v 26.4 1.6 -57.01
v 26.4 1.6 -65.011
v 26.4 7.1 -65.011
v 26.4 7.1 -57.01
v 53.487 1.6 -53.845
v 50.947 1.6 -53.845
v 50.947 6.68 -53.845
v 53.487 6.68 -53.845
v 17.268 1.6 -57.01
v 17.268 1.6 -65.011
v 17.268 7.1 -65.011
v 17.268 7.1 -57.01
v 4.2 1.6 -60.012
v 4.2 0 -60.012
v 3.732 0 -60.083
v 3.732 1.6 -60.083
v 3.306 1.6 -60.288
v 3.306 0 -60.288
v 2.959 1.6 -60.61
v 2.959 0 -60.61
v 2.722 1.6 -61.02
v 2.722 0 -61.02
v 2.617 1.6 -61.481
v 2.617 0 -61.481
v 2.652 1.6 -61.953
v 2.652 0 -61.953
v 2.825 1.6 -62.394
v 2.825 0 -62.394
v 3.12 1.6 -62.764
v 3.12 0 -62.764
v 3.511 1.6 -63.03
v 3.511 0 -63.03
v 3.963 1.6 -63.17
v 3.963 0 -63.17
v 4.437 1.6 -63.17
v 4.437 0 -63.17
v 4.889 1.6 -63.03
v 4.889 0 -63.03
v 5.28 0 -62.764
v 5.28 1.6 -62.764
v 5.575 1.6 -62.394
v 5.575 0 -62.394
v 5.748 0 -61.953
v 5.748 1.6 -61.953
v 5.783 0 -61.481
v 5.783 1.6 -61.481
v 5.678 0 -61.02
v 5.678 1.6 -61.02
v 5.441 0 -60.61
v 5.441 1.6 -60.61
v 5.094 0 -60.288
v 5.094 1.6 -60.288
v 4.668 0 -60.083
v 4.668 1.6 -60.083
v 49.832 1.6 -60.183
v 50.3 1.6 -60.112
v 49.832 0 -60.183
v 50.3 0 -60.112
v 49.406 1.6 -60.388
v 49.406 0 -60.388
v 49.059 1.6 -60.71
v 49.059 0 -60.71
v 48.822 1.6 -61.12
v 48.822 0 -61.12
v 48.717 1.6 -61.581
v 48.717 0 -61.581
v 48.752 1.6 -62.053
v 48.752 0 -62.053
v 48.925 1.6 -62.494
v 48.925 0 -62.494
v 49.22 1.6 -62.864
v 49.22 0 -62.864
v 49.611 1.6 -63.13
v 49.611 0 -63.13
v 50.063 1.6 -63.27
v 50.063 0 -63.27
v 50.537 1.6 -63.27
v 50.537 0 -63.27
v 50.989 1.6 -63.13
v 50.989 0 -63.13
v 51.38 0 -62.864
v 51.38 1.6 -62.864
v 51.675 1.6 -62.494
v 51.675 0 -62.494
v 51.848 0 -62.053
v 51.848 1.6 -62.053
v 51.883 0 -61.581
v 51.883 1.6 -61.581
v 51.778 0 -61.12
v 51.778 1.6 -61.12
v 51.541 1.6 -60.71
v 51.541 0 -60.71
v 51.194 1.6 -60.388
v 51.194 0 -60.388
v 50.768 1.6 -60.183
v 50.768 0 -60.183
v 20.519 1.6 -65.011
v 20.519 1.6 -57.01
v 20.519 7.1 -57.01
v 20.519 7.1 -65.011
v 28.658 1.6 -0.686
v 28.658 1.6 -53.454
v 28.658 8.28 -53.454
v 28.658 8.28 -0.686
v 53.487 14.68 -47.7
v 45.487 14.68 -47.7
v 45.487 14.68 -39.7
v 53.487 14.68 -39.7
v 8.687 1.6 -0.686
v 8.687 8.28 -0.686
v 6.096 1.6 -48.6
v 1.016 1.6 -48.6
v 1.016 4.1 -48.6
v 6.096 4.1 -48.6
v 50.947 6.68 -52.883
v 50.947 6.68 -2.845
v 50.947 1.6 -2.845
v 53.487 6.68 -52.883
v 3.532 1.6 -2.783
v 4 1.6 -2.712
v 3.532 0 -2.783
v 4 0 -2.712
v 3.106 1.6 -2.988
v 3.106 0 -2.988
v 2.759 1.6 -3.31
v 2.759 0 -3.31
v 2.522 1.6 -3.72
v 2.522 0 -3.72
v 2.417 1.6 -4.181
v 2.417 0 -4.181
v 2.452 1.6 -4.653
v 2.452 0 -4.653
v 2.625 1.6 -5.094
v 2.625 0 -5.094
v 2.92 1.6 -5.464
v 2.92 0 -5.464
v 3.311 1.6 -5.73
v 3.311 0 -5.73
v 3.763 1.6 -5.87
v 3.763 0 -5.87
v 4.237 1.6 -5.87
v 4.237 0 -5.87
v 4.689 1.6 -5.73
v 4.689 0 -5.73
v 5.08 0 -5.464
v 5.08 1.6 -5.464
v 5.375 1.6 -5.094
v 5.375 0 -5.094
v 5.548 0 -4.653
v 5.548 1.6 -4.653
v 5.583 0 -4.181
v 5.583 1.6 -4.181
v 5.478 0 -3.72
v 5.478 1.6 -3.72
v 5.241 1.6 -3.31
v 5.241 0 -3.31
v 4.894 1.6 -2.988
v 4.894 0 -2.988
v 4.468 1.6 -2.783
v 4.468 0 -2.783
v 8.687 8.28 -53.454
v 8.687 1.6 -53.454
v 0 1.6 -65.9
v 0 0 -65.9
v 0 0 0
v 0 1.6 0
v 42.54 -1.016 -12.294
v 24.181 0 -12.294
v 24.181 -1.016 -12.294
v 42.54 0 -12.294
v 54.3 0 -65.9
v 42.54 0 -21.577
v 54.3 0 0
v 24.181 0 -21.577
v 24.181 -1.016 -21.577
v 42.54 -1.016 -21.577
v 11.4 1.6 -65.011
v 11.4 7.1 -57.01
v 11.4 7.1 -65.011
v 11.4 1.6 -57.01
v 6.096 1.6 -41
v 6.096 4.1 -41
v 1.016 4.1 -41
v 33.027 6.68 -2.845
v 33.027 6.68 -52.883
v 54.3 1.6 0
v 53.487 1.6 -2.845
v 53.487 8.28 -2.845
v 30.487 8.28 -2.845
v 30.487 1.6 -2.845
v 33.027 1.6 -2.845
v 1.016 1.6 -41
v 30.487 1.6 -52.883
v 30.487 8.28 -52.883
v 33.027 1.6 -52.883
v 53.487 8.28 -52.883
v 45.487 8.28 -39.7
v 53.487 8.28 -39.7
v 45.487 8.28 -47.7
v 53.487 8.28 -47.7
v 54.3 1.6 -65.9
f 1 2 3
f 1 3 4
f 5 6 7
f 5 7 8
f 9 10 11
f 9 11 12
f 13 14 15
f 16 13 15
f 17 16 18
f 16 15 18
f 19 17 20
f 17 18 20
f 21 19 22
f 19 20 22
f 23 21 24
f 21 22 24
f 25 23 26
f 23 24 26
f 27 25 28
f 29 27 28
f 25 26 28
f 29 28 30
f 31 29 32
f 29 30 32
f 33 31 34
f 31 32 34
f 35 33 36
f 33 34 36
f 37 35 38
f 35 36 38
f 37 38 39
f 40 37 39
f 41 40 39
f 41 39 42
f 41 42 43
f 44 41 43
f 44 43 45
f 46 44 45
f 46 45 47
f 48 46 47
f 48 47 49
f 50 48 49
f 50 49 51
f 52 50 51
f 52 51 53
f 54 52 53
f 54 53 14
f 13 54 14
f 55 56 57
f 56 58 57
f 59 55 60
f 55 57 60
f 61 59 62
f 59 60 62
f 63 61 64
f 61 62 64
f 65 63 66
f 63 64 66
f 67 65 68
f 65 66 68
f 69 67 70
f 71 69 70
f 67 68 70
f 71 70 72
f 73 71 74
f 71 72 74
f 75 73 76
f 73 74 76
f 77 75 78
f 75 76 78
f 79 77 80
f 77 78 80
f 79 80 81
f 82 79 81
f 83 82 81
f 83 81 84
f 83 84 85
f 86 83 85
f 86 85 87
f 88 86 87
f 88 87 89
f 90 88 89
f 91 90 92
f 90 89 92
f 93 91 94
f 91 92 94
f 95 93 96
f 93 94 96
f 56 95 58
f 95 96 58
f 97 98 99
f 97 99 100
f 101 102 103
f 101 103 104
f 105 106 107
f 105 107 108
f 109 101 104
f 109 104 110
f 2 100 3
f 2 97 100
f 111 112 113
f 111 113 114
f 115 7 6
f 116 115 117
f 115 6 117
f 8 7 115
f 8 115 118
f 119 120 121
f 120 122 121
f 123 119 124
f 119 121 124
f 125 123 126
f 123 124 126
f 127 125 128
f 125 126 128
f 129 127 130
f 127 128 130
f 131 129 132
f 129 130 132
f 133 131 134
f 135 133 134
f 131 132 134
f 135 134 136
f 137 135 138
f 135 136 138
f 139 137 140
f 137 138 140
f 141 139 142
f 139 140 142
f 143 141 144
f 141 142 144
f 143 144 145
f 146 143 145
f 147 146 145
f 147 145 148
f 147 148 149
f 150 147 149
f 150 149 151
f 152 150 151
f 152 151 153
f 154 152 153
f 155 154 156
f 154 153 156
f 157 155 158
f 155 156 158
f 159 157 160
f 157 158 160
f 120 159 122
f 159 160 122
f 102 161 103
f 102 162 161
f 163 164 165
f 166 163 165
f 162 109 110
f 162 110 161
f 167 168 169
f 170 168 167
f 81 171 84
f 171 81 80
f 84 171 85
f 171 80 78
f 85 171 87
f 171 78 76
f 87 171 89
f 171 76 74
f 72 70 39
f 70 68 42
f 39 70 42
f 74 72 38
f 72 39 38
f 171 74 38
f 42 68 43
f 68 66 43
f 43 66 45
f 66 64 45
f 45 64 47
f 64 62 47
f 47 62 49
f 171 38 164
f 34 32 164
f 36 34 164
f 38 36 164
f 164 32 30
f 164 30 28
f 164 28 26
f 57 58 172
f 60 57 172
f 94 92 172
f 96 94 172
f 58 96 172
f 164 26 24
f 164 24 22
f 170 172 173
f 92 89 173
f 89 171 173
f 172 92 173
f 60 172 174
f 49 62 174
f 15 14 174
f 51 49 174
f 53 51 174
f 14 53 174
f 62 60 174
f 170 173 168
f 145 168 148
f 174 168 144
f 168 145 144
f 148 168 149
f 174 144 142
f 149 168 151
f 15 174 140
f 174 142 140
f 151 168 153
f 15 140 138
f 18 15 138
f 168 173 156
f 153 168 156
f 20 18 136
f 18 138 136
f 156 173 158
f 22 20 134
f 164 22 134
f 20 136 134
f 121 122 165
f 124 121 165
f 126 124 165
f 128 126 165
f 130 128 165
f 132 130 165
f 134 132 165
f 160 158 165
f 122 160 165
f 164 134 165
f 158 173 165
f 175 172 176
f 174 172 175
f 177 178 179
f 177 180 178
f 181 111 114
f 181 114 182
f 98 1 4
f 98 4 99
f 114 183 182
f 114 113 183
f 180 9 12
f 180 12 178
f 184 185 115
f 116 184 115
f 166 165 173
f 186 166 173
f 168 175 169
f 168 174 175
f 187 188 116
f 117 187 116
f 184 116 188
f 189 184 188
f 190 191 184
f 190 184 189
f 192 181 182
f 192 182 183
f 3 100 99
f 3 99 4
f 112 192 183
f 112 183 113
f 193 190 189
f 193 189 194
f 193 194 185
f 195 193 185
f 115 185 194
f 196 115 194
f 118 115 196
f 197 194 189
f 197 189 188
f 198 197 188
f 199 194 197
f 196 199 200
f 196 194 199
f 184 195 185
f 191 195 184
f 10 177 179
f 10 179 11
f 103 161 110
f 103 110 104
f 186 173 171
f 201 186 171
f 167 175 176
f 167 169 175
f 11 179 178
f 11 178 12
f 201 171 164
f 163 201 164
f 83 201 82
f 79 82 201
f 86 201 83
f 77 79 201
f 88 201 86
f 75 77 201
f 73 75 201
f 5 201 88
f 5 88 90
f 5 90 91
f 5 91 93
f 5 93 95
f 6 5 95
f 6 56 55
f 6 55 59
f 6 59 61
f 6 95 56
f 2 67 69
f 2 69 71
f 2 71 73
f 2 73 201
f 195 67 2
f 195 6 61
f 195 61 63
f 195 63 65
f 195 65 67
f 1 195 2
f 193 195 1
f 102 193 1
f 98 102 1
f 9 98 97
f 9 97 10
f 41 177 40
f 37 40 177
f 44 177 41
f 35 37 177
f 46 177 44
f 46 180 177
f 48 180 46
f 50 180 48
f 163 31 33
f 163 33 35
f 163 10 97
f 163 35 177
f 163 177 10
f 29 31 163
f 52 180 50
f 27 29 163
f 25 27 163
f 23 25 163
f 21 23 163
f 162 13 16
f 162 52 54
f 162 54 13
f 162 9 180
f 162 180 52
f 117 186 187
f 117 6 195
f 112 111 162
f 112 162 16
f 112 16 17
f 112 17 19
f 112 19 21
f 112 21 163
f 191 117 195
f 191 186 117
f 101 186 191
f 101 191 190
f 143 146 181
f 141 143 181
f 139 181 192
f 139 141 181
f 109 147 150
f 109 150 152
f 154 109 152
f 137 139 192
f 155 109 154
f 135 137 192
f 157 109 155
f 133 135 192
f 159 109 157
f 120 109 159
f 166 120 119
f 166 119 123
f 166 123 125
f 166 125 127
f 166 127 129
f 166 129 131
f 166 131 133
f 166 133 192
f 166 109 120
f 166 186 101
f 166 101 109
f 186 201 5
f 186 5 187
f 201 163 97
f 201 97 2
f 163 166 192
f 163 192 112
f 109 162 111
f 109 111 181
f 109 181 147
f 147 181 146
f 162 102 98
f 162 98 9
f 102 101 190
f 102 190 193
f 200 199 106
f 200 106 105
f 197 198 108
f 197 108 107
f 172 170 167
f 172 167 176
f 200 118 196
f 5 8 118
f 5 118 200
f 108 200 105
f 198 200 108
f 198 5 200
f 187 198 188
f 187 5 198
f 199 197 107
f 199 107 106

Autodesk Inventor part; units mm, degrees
ref_plane "YZ Plane" through (0, 0, 0) normal (1, 0, 0) x (0, 1, 0)
ref_plane "XZ Plane" through (0, 0, 0) normal (0, 1, 0) x (-1, 0, 0)
ref_plane "XY Plane" through (0, 0, 0) normal (0, 0, 1) x (1, 0, 0)
sketch "Sketch1" plane through (0, 0, 0) normal (0, 1, 0) x (-1, 0, 0)
  line L0 (0, 0) -> (-54.3, 0)
  line L1 (-54.3, 0) -> (-54.3, -65.9)
  line L2 (-54.3, -65.9) -> (0, -65.9)
  line L3 (0, -65.9) -> (0, 0)
  dimension "d0" = 54.3
  dimension "d1" = 65.9
extrude "Extrusion1" add sketch "Sketch1" along normal blind 1.6
sketch "Sketch2" plane through (0, 1.6, 0) normal (0, 1, 0) x (1, 0, 0)
  line L0 (0, 65.9) -> (0, 0) projected
  line L1 (54.3, 65.9) -> (0, 65.9) projected
  line L2 (54.3, 0) -> (54.3, 65.9) projected
  line L3 (0, 0) -> (54.3, 0) projected
  point P0 (4.2, 61.6)
  point P1 (50.3, 61.7)
  point P2 (4, 4.3)
  dimension "d4" = 4.2
  dimension "d5" = 4.3
  dimension "d6" = 4
  dimension "d7" = 4.2
  dimension "d8" = 4
  dimension "d9" = 4.3
hole "Hole1" at (4.2, 1.6, -61.6) at (50.3, 1.6, -61.7) at (4, 1.6, -4.3) direction (0, -1, 0) diameter 3.175 end through all
sketch "Sketch3" plane through (0, 1.6, 0) normal (0, 1, 0) x (1, 0, 0)
  line L0 (53.4872, 53.8448) -> (53.4872, 2.8448)
  line L1 (30.4872, 2.8448) -> (30.4872, 52.8828)
  line L2 (0, 0) -> (54.3, 0) projected
  line L3 (54.3, 0) -> (54.3, 65.9) projected
  line L4 (33.0272, 52.8828) -> (33.0272, 2.8448)
  line L5 (50.9472, 53.8448) -> (50.9472, 2.8448)
  line L6 (30.4872, 52.8828) -> (33.0272, 52.8828)
  line L7 (50.9472, 53.8448) -> (53.4872, 53.8448)
  line L8 (53.4872, 2.8448) -> (50.9472, 2.8448)
  line L9 (33.0272, 2.8448) -> (30.4872, 2.8448)
  dimension "d17" = 23
  dimension "d18" = 51
  dimension "d20" = 0.8128
  dimension "d21" = 2.54
  dimension "d22" = 2.54
extrude "Extrusion2" add sketch "Sketch3" along normal blind 5.08
sketch "Sketch4" plane through (0, 6.68, 0) normal (0, 1, 0) x (1, 0, 0)
  line L0 (30.4872, 52.8828) -> (30.4872, 2.8448) projected
  line L1 (30.4872, 2.8448) -> (33.0272, 2.8448) projected
  line L2 (33.0272, 2.8448) -> (33.0272, 52.8828) projected
  line L3 (33.0272, 52.8828) -> (30.4872, 52.8828) projected
  line L4 (53.4872, 2.8448) -> (53.4872, 53.8448) projected
  line L5 (50.9472, 53.8448) -> (50.9472, 2.8448) projected
  line L6 (50.9472, 2.8448) -> (53.4872, 2.8448) projected
  line L7 (53.4872, 53.8448) -> (50.9472, 53.8448) projected
  line L8 (30.4872, 52.8828) -> (30.4872, 2.8448) projected
  line L9 (30.4872, 52.8828) -> (53.4872, 52.8828)
  line L10 (53.4872, 52.8828) -> (53.4872, 2.8448)
  line L11 (53.4872, 2.8448) -> (30.4872, 2.8448)
  line L12 (30.4872, 2.8448) -> (30.4872, 52.8828)
  point P0 (0, 0)
extrude "Extrusion3" add sketch "Sketch4" along normal blind 1.6 contours L3 L2 L1 L0 | L9 L5 L11 L2 | L9 L4 L6 L5
sketch "Sketch5" plane through (0, 8.28, 0) normal (0, 1, 0) x (1, 0, 0)
  line L0 (45.4872, 47.7) -> (53.4872, 47.7)
  line L1 (53.4872, 47.7) -> (53.4872, 39.7)
  line L2 (53.4872, 39.7) -> (45.4872, 39.7)
  line L3 (45.4872, 39.7) -> (45.4872, 47.7)
  line L4 (53.4872, 2.8448) -> (53.4872, 52.8828) projected
  line L5 (53.4872, 52.8828) -> (30.4872, 52.8828) projected
  line L6 (0, 0) -> (54.3, 0) projected
  line L7 (30.4872, 52.8828) -> (30.4872, 2.8448) projected
  line L8 (30.4872, 2.8448) -> (53.4872, 2.8448) projected
  line L9 (53.4872, 2.8448) -> (53.4872, 52.8828) projected
  line L10 (53.4872, 52.8828) -> (30.4872, 52.8828) projected
  dimension "d27" = 8
  dimension "d28" = 8
  dimension "d61" = 39.7
extrude "Extrusion4" add sketch "Sketch5" along normal blind 6.4 contours L0 L1 L2 L3
sketch "Sketch7" plane through (0, 1.6, 0) normal (0, 1, 0) x (1, 0, 0)
  line L0 (1.016, 48.6) -> (6.096, 48.6)
  line L1 (6.096, 48.6) -> (6.096, 41)
  line L2 (6.096, 41) -> (1.016, 41)
  line L3 (1.016, 41) -> (1.016, 48.6)
  line L4 (54.3, 65.9) -> (0, 65.9) projected
  line L5 (0, 65.9) -> (0, 0) projected
  dimension "d32" = 5.08
  dimension "d33" = 7.6
  dimension "d34" = 17.3
  dimension "d35" = 1.016
extrude "Extrusion5" add sketch "Sketch7" along normal blind 2.5
sketch "Sketch8" plane through (0, 1.6, 0) normal (0, 1, 0) x (1, 0, 0)
  line L0 (11.4, 65.011) -> (17.268, 65.011)
  line L1 (17.268, 65.011) -> (17.268, 57.01)
  line L2 (17.268, 57.01) -> (11.4, 57.01)
  line L3 (11.4, 57.01) -> (11.4, 65.011)
  line L4 (0, 65.9) -> (0, 0) projected
  line L5 (54.3, 65.9) -> (0, 65.9) projected
  line L6 (20.5192, 65.011) -> (26.4, 65.011)
  line L7 (26.4, 65.011) -> (26.4, 57.01)
  line L8 (26.4, 57.01) -> (20.5192, 57.01)
  line L9 (20.5192, 57.01) -> (20.5192, 65.011)
  dimension "d39" = 8.001
  dimension "d40" = 11.4
  dimension "d41" = 0.889
  dimension "d43" = 8.001
  dimension "d44" = 3.2512
  dimension "d45" = 0.889
  dimension "d60" = 15
extrude "Extrusion6" add sketch "Sketch8" along normal blind 5.5
sketch "Sketch9" plane through (0, 1.6, 0) normal (0, 1, 0) x (1, 0, 0)
  line L0 (8.6868, 53.454) -> (28.6584, 53.454)
  line L1 (28.6584, 53.454) -> (28.6584, 0.6858)
  line L2 (28.6584, 0.6858) -> (8.6868, 0.6858)
  line L3 (8.6868, 0.6858) -> (8.6868, 53.454)
  line L4 (54.3, 65.9) -> (0, 65.9) projected
  line L5 (30.4872, 52.8828) -> (30.4872, 2.8448) projected
  line L6 (0, 65.9) -> (0, 0) projected
  line L7 (0, 0) -> (54.3, 0) projected
  dimension "d48" = 12.446
  dimension "d49" = 1.8288
  dimension "d50" = 8.6868
  dimension "d51" = 0.6858
extrude "Extrusion7" add sketch "Sketch9" along normal up to surface (6.68 mm away)
sketch "Sketch10" plane through (0, 0, 0) normal (0, -1, 0) x (1, 0, 0)
  line L0 (42.5398, -21.577) -> (24.1808, -21.577)
  line L1 (24.1808, -21.577) -> (24.1808, -12.2936)
  line L2 (24.1808, -12.2936) -> (42.5398, -12.2936)
  line L3 (42.5398, -12.2936) -> (42.5398, -21.577)
  line L4 (54.3, -65.9) -> (0, -65.9) projected
  line L5 (54.3, 0) -> (54.3, -65.9) projected
  line L6 (0, -65.9) -> (0, 0) projected
  line L7 (0, 0) -> (54.3, 0) projected
  dimension "d54" = 44.323
  dimension "d55" = 11.7602
  dimension "d56" = 24.1808
  dimension "d57" = 12.2936
extrude "Extrusion8" add sketch "Sketch10" along normal blind 1.016 contours L0 L1 L2 L3
properties part number "PCB"
